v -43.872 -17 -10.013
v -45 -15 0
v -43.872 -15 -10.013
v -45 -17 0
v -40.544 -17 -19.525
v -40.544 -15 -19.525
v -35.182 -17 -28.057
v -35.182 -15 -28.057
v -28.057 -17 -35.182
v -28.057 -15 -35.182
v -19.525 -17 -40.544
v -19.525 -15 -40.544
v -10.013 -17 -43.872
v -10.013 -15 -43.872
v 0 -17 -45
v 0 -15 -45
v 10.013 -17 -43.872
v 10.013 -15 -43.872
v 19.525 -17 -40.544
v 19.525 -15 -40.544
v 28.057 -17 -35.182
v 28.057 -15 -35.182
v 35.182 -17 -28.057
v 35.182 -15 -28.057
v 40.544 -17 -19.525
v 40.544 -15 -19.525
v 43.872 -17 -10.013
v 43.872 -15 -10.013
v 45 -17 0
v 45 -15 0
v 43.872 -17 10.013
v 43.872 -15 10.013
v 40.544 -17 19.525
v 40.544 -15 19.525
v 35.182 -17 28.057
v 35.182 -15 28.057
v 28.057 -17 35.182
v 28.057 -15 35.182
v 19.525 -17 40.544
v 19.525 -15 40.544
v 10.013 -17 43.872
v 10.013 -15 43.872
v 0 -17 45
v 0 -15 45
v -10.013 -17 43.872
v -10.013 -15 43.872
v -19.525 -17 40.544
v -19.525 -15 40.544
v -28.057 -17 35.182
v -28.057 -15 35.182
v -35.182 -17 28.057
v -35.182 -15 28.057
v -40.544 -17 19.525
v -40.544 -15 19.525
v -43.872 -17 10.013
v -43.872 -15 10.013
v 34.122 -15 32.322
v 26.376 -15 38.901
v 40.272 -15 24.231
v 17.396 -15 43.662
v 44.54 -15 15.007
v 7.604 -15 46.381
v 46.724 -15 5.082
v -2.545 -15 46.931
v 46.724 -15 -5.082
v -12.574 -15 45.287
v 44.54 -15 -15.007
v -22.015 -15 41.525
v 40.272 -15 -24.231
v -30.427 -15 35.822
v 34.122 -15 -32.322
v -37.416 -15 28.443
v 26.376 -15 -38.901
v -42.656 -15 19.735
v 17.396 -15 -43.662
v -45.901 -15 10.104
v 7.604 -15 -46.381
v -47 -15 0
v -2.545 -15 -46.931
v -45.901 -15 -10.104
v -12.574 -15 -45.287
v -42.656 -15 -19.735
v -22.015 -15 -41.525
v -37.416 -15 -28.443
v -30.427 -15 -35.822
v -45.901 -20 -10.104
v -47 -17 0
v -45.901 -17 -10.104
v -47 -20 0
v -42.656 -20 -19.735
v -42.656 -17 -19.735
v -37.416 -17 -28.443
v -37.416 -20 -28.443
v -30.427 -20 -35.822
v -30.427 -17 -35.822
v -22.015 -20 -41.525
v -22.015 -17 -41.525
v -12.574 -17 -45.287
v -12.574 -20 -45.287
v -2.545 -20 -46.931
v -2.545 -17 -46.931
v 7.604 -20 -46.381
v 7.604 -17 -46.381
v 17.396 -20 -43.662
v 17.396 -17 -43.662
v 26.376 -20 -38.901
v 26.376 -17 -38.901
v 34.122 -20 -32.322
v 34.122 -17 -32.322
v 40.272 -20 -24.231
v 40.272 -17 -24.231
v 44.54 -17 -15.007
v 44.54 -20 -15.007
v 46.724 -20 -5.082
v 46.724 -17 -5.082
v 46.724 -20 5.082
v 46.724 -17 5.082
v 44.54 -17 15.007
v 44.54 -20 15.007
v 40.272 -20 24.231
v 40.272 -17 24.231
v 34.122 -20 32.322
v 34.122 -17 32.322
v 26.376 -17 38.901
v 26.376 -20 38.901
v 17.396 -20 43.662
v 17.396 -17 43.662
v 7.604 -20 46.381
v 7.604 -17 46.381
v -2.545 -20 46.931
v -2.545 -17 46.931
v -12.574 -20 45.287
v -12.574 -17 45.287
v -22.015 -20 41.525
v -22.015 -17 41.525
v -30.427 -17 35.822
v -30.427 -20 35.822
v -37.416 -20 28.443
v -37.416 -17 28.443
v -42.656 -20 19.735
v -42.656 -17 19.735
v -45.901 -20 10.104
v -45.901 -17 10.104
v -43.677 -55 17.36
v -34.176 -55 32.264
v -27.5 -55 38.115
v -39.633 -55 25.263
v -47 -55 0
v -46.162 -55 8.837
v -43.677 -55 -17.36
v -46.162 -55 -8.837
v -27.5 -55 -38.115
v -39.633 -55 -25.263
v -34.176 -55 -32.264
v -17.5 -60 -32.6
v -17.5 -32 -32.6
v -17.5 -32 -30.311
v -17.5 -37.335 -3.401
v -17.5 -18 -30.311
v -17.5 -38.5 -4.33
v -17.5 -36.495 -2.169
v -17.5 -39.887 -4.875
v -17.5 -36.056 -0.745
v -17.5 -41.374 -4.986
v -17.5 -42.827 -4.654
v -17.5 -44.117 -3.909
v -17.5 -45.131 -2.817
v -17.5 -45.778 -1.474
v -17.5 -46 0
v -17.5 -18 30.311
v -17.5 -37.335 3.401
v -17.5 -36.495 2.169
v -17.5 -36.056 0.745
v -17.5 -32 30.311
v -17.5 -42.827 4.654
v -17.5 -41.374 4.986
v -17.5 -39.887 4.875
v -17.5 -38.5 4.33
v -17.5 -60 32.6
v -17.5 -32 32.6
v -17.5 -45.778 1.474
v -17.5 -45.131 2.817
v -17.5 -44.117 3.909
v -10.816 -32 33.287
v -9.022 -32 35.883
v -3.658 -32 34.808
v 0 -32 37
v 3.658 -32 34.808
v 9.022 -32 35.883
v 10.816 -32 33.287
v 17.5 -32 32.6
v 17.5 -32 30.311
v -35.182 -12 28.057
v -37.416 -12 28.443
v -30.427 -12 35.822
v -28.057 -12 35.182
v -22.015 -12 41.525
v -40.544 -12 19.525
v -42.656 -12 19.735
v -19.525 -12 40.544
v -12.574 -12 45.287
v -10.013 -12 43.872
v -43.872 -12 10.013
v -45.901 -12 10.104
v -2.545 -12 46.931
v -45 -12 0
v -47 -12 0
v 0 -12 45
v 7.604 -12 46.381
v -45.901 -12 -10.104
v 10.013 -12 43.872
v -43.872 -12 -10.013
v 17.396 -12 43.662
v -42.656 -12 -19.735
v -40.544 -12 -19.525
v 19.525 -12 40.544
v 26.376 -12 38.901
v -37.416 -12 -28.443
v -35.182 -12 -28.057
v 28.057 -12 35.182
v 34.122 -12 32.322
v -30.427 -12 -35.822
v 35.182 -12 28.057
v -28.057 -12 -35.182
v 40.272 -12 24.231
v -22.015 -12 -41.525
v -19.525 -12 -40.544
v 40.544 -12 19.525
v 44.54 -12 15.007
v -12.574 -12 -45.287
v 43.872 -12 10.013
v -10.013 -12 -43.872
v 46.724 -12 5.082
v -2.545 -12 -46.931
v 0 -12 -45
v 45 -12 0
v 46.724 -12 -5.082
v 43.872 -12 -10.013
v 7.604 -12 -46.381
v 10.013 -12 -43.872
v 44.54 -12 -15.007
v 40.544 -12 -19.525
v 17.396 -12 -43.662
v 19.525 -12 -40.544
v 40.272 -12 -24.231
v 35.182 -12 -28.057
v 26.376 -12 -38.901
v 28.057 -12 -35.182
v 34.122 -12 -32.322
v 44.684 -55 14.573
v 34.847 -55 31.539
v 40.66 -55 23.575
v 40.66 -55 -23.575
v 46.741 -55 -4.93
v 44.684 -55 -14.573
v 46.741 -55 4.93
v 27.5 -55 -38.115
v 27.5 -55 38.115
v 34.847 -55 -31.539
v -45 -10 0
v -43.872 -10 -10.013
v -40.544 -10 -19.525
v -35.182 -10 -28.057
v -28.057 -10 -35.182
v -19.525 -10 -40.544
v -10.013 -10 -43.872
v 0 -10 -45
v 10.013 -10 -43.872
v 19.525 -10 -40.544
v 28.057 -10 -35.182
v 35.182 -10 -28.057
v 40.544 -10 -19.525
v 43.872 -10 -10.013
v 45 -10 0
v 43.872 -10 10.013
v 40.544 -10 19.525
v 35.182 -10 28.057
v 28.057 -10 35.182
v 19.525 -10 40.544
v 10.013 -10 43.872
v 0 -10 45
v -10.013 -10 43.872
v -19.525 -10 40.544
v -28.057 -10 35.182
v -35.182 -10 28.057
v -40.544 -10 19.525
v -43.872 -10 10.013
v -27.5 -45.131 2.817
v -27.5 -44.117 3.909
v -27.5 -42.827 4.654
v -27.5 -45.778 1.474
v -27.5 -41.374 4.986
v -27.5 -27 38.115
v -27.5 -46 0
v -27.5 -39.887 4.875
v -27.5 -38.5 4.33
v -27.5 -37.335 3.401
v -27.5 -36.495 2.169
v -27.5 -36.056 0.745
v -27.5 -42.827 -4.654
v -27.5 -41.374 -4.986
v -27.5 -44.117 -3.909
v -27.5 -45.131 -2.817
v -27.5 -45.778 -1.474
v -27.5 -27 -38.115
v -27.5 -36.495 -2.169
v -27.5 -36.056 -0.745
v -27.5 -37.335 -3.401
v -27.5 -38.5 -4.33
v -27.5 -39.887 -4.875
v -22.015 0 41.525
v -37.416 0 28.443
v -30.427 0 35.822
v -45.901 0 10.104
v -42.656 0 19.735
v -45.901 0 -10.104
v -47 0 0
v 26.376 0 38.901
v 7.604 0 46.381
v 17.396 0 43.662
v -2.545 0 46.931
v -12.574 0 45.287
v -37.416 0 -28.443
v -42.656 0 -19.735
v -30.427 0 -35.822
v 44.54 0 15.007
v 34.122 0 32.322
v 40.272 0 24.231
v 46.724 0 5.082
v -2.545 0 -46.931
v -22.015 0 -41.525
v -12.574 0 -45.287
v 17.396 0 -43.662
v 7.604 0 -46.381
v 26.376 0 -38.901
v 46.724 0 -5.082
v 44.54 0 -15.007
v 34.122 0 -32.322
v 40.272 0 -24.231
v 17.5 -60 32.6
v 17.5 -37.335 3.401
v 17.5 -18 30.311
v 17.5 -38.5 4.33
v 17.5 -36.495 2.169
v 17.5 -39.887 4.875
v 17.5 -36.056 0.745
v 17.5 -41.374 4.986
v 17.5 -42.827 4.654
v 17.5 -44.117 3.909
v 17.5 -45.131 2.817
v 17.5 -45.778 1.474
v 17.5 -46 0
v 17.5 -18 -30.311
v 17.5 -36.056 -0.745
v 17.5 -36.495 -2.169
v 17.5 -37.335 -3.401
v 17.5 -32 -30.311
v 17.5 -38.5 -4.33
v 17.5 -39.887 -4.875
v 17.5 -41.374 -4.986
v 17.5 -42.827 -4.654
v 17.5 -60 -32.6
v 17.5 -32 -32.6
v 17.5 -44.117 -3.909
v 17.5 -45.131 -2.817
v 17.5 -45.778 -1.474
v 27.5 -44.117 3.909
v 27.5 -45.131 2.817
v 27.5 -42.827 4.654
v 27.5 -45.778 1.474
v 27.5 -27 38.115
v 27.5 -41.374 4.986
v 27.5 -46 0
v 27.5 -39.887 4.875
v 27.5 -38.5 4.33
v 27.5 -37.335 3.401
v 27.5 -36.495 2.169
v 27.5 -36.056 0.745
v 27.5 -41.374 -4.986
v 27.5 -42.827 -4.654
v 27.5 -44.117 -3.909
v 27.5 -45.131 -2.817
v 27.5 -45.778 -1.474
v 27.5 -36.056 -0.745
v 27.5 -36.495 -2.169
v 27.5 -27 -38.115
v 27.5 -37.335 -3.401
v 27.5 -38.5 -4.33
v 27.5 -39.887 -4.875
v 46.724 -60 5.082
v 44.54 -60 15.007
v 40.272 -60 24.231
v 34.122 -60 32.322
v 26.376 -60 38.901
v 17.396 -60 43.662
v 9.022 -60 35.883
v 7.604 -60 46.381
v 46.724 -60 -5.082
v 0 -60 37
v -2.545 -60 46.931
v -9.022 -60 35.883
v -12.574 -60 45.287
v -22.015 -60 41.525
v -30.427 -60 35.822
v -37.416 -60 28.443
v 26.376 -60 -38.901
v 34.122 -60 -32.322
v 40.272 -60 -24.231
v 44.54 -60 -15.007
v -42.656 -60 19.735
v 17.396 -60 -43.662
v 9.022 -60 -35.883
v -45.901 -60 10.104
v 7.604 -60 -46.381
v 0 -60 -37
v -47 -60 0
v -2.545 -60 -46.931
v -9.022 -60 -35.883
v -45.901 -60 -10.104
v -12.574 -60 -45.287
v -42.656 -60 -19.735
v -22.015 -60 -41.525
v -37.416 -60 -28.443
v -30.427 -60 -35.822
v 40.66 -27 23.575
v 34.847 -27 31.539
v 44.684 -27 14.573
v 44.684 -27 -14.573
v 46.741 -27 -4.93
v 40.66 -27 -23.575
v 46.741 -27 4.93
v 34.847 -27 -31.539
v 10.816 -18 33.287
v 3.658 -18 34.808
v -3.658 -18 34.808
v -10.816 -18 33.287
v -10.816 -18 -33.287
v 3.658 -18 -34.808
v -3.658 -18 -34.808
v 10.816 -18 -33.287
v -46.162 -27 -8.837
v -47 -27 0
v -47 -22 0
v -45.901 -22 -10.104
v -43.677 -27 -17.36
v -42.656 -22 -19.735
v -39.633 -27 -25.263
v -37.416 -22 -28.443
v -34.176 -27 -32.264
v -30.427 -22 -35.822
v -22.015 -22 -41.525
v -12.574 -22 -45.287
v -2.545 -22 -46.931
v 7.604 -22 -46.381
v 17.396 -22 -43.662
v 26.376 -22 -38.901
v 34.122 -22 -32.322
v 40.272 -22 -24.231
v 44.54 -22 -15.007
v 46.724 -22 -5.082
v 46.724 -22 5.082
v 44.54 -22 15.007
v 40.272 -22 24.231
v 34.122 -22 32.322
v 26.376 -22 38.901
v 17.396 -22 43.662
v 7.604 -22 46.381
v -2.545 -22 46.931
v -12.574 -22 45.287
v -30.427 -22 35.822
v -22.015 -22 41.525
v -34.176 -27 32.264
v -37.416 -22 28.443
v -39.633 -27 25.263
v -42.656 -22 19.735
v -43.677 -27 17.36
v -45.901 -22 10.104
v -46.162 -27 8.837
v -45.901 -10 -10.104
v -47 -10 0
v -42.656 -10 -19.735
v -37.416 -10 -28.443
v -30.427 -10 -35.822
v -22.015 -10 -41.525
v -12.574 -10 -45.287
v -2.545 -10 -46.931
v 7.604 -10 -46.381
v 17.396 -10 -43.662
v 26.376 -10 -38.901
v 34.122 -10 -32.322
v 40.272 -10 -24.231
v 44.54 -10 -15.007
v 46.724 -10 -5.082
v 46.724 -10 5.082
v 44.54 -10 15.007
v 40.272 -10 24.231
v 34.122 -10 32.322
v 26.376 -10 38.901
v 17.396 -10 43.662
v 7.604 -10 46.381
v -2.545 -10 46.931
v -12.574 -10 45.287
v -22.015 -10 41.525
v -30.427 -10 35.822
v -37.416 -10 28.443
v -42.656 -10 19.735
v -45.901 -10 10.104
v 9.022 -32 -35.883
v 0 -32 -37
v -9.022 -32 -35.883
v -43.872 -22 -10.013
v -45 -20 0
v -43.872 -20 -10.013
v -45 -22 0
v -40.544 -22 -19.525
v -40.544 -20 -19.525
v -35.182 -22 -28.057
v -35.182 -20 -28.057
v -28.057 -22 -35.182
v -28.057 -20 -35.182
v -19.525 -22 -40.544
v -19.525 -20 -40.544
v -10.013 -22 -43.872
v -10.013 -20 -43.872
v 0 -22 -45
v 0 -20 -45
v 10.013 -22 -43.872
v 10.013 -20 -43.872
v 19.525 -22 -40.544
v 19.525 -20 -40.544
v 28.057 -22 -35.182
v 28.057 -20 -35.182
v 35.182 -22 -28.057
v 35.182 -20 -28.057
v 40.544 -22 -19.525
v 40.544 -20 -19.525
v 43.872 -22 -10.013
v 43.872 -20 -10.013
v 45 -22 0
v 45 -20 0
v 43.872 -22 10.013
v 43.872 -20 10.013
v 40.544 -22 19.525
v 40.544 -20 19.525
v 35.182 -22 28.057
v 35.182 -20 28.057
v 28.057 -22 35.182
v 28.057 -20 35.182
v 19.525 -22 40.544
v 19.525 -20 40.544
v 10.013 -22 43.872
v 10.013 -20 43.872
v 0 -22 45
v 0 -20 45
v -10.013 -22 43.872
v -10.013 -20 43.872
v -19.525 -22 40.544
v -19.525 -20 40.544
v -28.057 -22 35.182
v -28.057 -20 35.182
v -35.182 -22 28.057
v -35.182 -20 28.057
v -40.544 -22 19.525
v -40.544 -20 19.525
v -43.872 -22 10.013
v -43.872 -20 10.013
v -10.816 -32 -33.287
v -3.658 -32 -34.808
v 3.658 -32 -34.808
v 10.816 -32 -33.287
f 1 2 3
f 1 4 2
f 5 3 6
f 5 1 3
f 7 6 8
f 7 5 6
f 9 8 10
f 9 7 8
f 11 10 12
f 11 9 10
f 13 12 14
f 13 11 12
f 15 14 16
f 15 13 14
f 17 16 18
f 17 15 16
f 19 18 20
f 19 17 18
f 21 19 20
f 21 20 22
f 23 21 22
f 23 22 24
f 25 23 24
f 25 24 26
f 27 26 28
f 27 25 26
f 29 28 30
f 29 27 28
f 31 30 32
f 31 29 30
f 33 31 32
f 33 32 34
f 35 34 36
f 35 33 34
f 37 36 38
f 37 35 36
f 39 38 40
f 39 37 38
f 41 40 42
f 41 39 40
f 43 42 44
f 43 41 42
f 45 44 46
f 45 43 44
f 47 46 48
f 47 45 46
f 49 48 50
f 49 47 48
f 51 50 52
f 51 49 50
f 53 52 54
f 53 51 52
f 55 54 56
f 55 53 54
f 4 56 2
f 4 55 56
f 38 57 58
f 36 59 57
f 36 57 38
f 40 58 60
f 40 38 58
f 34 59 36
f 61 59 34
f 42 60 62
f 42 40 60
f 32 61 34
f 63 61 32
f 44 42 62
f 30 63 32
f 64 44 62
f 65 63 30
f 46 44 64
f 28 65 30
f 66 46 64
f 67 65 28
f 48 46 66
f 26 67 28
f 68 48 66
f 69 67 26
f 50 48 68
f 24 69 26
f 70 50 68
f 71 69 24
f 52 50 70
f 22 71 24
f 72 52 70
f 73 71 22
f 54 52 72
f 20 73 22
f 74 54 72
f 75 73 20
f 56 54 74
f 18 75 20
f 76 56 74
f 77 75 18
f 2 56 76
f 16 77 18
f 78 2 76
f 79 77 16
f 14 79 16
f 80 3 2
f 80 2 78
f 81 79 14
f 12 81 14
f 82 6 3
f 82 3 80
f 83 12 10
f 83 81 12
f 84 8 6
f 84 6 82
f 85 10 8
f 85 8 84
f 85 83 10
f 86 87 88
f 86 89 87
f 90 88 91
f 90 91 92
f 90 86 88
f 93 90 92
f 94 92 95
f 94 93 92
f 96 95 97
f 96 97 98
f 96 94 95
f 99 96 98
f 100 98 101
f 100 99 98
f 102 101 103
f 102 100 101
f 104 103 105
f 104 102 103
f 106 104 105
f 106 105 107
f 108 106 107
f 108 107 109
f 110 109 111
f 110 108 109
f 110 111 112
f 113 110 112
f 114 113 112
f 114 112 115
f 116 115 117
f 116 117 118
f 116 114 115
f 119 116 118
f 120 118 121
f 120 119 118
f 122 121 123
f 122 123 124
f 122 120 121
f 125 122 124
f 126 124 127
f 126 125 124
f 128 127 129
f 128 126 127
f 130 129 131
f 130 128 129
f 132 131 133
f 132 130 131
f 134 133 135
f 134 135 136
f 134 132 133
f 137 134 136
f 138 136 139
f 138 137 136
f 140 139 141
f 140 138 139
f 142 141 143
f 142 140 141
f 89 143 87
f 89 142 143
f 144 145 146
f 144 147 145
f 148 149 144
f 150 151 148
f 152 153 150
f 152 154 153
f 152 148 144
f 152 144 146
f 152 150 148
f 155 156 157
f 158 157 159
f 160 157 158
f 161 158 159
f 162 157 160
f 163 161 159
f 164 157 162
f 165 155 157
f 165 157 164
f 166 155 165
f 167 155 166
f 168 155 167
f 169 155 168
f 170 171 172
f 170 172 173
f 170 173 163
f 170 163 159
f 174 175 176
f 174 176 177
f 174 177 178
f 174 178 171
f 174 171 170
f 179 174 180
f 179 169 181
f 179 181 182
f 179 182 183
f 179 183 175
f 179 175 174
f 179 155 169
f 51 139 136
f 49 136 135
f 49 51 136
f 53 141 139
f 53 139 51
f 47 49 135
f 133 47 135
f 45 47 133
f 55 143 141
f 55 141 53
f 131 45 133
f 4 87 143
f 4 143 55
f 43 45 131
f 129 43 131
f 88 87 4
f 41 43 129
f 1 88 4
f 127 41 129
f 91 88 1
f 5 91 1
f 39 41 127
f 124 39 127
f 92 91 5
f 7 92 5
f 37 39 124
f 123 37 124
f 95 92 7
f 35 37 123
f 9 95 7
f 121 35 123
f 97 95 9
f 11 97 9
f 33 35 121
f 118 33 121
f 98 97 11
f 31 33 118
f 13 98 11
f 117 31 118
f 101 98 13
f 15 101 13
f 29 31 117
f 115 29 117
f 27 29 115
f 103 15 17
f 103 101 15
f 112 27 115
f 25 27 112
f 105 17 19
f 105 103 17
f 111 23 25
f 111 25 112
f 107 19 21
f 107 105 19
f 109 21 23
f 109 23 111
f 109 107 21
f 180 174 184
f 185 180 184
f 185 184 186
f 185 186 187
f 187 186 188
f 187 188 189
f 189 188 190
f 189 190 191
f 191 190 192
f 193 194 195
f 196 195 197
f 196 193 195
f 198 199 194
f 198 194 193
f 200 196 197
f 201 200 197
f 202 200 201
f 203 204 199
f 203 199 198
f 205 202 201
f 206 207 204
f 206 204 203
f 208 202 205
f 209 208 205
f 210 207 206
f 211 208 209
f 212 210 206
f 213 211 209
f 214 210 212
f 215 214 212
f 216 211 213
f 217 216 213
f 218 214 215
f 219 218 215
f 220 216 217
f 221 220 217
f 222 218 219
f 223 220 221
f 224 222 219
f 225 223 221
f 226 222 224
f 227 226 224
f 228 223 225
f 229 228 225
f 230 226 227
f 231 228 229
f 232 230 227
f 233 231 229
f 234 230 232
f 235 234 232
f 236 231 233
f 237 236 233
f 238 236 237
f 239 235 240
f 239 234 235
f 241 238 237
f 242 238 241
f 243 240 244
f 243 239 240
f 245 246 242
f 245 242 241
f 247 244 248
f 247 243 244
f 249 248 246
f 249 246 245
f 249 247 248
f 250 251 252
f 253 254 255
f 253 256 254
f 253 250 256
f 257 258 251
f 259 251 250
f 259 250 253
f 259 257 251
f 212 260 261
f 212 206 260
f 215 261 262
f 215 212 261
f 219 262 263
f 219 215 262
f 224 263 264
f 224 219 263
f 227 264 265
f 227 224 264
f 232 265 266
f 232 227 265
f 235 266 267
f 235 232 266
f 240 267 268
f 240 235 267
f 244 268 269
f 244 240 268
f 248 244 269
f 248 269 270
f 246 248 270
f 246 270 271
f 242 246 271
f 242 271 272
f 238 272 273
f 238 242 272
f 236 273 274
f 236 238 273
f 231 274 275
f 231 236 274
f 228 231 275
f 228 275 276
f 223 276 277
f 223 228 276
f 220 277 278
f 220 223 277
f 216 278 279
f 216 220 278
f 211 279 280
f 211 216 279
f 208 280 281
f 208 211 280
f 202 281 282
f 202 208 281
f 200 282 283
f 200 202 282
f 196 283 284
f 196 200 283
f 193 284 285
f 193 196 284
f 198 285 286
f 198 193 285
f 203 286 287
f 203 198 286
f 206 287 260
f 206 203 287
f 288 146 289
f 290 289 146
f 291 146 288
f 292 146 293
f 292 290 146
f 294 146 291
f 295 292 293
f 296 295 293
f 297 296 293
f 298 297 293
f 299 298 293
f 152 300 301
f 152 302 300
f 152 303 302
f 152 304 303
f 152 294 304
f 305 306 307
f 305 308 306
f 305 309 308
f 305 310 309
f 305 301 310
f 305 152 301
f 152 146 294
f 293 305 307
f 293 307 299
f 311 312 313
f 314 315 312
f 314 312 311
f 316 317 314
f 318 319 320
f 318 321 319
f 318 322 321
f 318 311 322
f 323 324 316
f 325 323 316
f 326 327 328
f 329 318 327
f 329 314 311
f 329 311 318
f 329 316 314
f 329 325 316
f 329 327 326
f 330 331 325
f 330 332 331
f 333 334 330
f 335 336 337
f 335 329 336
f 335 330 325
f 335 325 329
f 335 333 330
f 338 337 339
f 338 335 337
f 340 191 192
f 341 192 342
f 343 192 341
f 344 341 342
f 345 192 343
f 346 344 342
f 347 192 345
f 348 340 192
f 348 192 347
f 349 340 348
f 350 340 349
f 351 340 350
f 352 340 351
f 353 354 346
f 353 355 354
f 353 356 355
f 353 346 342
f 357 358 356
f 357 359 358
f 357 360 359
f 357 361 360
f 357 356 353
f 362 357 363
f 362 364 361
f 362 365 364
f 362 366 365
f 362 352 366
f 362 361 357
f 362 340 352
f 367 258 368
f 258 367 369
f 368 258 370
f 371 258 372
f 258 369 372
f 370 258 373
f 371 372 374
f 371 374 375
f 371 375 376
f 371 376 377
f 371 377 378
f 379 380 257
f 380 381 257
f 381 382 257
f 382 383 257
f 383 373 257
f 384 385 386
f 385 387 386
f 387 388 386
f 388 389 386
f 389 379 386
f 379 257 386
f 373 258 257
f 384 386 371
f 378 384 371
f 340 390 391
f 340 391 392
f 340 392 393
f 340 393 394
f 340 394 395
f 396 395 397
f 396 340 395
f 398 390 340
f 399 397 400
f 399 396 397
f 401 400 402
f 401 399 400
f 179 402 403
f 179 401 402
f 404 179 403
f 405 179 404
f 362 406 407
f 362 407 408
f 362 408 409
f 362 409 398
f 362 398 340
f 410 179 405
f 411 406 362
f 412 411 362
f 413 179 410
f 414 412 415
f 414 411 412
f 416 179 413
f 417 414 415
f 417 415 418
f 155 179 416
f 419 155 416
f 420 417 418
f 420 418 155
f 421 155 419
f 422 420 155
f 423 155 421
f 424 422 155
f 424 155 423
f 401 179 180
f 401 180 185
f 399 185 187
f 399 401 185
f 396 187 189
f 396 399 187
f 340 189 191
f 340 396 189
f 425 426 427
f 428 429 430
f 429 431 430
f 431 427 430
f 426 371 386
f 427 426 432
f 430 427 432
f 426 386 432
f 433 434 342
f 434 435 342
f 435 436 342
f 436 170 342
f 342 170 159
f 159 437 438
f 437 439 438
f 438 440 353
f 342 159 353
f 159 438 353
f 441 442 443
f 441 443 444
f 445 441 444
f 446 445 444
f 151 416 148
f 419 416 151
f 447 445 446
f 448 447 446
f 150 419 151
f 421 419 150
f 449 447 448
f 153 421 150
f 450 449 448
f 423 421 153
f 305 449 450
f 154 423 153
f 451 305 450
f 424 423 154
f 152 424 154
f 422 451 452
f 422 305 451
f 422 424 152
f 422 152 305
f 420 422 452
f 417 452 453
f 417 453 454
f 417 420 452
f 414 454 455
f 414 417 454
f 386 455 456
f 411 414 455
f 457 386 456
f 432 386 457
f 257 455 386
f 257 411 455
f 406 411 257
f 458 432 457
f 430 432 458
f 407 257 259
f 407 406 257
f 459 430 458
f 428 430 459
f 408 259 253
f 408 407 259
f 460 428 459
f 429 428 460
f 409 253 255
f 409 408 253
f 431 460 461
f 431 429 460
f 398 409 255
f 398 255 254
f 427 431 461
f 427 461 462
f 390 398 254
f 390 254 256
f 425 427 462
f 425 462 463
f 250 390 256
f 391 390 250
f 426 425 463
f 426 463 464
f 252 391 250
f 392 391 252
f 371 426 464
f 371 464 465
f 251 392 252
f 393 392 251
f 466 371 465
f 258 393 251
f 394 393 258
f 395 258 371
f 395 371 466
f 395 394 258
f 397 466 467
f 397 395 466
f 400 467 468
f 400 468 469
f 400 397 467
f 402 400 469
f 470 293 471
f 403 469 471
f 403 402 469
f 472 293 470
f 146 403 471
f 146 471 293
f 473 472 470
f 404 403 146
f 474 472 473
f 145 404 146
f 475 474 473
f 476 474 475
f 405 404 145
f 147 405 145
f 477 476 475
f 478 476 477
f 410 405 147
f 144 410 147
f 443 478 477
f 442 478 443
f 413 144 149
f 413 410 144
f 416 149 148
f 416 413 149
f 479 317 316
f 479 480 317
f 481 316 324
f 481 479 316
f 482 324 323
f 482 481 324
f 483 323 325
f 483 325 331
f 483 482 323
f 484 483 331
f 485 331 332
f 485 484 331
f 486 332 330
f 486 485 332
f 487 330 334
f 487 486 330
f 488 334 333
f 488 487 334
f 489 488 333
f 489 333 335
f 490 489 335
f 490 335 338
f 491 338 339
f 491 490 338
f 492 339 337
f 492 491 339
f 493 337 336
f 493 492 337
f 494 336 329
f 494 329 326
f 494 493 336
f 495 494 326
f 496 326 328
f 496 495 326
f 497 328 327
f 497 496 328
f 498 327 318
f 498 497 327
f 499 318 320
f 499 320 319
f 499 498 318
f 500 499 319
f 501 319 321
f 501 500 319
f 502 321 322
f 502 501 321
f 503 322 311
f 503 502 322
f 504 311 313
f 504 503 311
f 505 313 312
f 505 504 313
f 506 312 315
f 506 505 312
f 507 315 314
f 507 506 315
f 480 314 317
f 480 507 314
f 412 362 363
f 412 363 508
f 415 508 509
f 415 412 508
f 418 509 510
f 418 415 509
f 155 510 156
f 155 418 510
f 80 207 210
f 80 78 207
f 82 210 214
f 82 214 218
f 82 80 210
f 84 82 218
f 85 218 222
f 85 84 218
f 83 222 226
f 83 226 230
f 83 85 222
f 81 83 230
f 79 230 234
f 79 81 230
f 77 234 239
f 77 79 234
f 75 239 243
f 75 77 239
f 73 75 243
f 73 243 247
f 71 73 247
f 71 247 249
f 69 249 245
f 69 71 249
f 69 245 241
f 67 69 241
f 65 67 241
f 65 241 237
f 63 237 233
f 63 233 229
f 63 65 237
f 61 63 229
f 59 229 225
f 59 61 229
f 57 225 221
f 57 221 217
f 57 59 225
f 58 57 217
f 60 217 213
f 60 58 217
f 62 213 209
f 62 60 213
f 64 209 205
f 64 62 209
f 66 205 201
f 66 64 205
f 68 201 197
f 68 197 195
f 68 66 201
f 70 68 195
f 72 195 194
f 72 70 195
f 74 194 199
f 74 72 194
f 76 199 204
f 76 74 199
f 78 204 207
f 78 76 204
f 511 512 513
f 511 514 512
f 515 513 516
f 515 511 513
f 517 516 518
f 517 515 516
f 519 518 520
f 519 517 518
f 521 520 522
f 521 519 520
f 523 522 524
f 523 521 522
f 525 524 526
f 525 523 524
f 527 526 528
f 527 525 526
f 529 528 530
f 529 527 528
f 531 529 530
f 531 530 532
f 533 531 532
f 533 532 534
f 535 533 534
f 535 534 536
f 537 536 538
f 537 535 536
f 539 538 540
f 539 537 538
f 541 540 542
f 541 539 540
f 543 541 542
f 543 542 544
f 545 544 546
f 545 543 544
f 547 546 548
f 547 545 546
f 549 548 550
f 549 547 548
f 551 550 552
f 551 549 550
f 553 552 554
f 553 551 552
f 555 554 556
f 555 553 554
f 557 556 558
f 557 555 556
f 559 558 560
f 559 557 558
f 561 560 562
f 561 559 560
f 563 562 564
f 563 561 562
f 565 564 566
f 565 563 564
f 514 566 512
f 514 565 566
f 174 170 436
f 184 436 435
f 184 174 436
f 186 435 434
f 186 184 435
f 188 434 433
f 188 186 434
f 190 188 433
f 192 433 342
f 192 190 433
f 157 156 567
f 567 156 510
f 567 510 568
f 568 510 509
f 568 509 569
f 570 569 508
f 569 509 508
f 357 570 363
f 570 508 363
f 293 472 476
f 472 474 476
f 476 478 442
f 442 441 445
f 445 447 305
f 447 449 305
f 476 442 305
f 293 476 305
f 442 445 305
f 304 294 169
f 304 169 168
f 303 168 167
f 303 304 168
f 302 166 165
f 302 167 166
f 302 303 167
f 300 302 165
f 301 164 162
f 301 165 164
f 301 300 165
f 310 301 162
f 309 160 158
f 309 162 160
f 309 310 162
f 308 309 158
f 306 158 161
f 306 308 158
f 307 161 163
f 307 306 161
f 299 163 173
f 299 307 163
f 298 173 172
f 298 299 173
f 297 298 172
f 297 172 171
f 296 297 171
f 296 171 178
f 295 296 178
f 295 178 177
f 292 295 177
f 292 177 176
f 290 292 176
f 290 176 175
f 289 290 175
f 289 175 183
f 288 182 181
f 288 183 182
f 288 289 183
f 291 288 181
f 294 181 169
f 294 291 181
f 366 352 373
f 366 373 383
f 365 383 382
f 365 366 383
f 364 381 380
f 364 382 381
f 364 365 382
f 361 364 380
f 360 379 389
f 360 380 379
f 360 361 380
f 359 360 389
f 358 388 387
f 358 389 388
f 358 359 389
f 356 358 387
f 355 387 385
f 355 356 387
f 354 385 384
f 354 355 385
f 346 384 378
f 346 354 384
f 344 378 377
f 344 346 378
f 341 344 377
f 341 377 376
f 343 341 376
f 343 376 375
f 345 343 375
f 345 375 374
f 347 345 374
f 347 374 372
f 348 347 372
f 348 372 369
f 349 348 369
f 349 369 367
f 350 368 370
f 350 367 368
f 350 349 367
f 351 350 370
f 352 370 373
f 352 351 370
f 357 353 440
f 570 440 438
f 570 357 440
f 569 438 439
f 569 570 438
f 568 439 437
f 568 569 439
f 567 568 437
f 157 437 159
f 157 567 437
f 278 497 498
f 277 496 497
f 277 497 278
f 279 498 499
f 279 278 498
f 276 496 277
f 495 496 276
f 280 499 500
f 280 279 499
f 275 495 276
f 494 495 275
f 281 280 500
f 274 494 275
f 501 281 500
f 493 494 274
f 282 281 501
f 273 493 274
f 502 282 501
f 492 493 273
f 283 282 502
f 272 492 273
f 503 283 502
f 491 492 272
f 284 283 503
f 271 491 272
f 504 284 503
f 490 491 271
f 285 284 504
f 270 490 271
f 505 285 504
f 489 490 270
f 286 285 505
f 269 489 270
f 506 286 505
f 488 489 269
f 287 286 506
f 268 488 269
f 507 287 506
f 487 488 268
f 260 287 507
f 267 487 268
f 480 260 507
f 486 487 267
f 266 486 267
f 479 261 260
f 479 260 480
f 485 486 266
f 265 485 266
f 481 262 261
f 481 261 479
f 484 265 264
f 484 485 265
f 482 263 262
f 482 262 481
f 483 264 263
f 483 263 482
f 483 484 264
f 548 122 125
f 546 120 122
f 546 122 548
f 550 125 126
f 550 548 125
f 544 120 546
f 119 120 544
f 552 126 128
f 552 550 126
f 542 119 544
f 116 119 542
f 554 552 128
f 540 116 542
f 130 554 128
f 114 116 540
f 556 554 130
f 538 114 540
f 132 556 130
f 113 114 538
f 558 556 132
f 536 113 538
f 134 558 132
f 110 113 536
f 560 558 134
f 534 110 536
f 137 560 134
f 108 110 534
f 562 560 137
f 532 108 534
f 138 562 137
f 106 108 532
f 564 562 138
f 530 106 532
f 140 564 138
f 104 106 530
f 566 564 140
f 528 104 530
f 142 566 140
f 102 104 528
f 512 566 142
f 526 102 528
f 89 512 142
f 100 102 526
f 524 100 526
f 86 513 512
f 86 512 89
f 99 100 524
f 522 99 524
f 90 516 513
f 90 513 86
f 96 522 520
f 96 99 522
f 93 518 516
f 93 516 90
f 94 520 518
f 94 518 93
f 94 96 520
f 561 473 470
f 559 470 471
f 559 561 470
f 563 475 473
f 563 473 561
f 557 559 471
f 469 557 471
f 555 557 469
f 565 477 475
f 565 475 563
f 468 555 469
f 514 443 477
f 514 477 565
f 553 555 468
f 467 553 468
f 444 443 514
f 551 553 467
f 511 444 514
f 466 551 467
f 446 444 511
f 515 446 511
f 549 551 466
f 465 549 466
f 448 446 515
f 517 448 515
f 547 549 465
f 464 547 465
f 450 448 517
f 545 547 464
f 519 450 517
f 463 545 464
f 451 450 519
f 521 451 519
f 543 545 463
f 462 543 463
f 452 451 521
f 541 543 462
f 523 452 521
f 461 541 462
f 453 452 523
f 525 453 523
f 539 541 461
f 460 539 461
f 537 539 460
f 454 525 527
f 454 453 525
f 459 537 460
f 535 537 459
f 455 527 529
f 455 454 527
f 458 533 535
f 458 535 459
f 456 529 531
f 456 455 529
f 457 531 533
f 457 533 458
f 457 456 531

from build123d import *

# Parameters (mm, degrees)
CUT_EXTRUDE1_DEPTH      = 90.543285622
CUT_EXTRUDE1_DEPTH_BACK = 90.543285622
SKETCH3_W               = 20
SKETCH3_H               = 28
SHELL1_START            = -60
SHELL1_DEPTH            = 50
SHELL1_START_2          = -17
SHELL1_2_DEPTH          = 7
SHELL1_3_DEPTH          = 28
SKETCH4_R               = 41
BOSS_EXTRUDE2_DEPTH     = 18
CUT_EXTRUDE2_DEPTH      = 107.579782323
CUT_EXTRUDE2_DEPTH_BACK = 107.579782323
SKETCH5_R               = 5


# Read off the part's stored shape, not the designer's step: Shell1
with BuildPart() as part:
    # Sketch1 → Revolve1 (revolve)
    with BuildSketch(Plane.XY):
        Polygon((0, -60), (0, 0), (-47, 0), (-47, -10), (-45, -10), (-45, -12), (-47, -12), (-47, -15), (-45, -15), (-45, -17), (-47, -17), (-47, -20), (-45, -20), (-45, -22), (-47, -22), (-47, -60), align=None)
    revolve(axis=Axis((0, 0, 0), (0, -1, 0)))

    # Sketch3 → Cut-Extrude1 (cut, two sides: drawn at the far end of the back side and taken through both)
    with BuildSketch(Plane.XY.offset(-CUT_EXTRUDE1_DEPTH_BACK)):
        with Locations((-37.5, -41)):
            Rectangle(SKETCH3_W, SKETCH3_H)
        with Locations((37.5, -41)):
            Rectangle(SKETCH3_W, SKETCH3_H)
    extrude(amount=CUT_EXTRUDE1_DEPTH + CUT_EXTRUDE1_DEPTH_BACK, mode=Mode.SUBTRACT)

    # Shell1 outline → Shell1 (cut)
    with BuildSketch(Plane(origin=(0, 0, 0), x_dir=(1, 0, 0), z_dir=(0, 1, 0)).offset(SHELL1_START)):
        with BuildLine():
            Line((17.5, -30.310889132), (17.5, 30.310889132))
            ThreePointArc((17.5, 30.310889132), (0, 35), (-17.5, 30.310889132))
            Line((-17.5, 30.310889132), (-17.5, -30.310889132))
            ThreePointArc((-17.5, -30.310889132), (0, -35), (17.5, -30.310889132))
        make_face()
    extrude(amount=SHELL1_DEPTH, mode=Mode.SUBTRACT)

    # Shell1 2 outline → Shell1 2 (cut)
    with BuildSketch(Plane(origin=(0, 0, 0), x_dir=(1, 0, 0), z_dir=(0, 1, 0)).offset(SHELL1_START_2)):
        with BuildLine():
            ThreePointArc((17.5, -30.310889132), (35, 0), (17.5, 30.310889132))
            Line((17.5, 30.310889132), (17.5, -30.310889132))
        make_face()
        with BuildLine():
            Line((-17.5, -30.310889132), (-17.5, 30.310889132))
            ThreePointArc((-17.5, 30.310889132), (-35, 0), (-17.5, -30.310889132))
        make_face()
    extrude(amount=SHELL1_2_DEPTH, mode=Mode.SUBTRACT)

    # Shell1 3 outline → Shell1 3 (cut)
    with BuildSketch(Plane(origin=(0, 0, 0), x_dir=(1, 0, 0), z_dir=(0, 1, 0)).offset(SHELL1_START)):
        with BuildLine():
            Line((17.5, 30.310889132), (17.5, 32.599846625))
            ThreePointArc((17.5, 32.599846625), (0, 37), (-17.5, 32.599846625))
            Line((-17.5, 32.599846625), (-17.5, 30.310889132))
            ThreePointArc((-17.5, 30.310889132), (0, 35), (17.5, 30.310889132))
        make_face()
        with BuildLine():
            Line((17.5, -32.599846625), (17.5, -30.310889132))
            ThreePointArc((17.5, -30.310889132), (0, -35), (-17.5, -30.310889132))
            Line((-17.5, -30.310889132), (-17.5, -32.599846625))
            ThreePointArc((-17.5, -32.599846625), (0, -37), (17.5, -32.599846625))
        make_face()
    extrude(amount=SHELL1_3_DEPTH, mode=Mode.SUBTRACT)

    # Sketch4 → Boss-Extrude2 (add)
    with BuildSketch(Plane(origin=(0, 0, 0), x_dir=(1, 0, 0), z_dir=(0, 1, 0))):
        Circle(SKETCH4_R)
    extrude(amount=-BOSS_EXTRUDE2_DEPTH)

    # Sketch5 → Cut-Extrude2 (cut, two sides: drawn at the far end of the back side and taken through both)
    with BuildSketch(Plane(origin=(27.5, 0, 0), x_dir=(0, 0, -1), z_dir=(1, 0, 0)).offset(-CUT_EXTRUDE2_DEPTH_BACK)):
        with Locations(Location((0, -41, 0), (0, 0, 270))):
            Circle(SKETCH5_R)
    extrude(amount=CUT_EXTRUDE2_DEPTH + CUT_EXTRUDE2_DEPTH_BACK, mode=Mode.SUBTRACT)


solid = part.part
